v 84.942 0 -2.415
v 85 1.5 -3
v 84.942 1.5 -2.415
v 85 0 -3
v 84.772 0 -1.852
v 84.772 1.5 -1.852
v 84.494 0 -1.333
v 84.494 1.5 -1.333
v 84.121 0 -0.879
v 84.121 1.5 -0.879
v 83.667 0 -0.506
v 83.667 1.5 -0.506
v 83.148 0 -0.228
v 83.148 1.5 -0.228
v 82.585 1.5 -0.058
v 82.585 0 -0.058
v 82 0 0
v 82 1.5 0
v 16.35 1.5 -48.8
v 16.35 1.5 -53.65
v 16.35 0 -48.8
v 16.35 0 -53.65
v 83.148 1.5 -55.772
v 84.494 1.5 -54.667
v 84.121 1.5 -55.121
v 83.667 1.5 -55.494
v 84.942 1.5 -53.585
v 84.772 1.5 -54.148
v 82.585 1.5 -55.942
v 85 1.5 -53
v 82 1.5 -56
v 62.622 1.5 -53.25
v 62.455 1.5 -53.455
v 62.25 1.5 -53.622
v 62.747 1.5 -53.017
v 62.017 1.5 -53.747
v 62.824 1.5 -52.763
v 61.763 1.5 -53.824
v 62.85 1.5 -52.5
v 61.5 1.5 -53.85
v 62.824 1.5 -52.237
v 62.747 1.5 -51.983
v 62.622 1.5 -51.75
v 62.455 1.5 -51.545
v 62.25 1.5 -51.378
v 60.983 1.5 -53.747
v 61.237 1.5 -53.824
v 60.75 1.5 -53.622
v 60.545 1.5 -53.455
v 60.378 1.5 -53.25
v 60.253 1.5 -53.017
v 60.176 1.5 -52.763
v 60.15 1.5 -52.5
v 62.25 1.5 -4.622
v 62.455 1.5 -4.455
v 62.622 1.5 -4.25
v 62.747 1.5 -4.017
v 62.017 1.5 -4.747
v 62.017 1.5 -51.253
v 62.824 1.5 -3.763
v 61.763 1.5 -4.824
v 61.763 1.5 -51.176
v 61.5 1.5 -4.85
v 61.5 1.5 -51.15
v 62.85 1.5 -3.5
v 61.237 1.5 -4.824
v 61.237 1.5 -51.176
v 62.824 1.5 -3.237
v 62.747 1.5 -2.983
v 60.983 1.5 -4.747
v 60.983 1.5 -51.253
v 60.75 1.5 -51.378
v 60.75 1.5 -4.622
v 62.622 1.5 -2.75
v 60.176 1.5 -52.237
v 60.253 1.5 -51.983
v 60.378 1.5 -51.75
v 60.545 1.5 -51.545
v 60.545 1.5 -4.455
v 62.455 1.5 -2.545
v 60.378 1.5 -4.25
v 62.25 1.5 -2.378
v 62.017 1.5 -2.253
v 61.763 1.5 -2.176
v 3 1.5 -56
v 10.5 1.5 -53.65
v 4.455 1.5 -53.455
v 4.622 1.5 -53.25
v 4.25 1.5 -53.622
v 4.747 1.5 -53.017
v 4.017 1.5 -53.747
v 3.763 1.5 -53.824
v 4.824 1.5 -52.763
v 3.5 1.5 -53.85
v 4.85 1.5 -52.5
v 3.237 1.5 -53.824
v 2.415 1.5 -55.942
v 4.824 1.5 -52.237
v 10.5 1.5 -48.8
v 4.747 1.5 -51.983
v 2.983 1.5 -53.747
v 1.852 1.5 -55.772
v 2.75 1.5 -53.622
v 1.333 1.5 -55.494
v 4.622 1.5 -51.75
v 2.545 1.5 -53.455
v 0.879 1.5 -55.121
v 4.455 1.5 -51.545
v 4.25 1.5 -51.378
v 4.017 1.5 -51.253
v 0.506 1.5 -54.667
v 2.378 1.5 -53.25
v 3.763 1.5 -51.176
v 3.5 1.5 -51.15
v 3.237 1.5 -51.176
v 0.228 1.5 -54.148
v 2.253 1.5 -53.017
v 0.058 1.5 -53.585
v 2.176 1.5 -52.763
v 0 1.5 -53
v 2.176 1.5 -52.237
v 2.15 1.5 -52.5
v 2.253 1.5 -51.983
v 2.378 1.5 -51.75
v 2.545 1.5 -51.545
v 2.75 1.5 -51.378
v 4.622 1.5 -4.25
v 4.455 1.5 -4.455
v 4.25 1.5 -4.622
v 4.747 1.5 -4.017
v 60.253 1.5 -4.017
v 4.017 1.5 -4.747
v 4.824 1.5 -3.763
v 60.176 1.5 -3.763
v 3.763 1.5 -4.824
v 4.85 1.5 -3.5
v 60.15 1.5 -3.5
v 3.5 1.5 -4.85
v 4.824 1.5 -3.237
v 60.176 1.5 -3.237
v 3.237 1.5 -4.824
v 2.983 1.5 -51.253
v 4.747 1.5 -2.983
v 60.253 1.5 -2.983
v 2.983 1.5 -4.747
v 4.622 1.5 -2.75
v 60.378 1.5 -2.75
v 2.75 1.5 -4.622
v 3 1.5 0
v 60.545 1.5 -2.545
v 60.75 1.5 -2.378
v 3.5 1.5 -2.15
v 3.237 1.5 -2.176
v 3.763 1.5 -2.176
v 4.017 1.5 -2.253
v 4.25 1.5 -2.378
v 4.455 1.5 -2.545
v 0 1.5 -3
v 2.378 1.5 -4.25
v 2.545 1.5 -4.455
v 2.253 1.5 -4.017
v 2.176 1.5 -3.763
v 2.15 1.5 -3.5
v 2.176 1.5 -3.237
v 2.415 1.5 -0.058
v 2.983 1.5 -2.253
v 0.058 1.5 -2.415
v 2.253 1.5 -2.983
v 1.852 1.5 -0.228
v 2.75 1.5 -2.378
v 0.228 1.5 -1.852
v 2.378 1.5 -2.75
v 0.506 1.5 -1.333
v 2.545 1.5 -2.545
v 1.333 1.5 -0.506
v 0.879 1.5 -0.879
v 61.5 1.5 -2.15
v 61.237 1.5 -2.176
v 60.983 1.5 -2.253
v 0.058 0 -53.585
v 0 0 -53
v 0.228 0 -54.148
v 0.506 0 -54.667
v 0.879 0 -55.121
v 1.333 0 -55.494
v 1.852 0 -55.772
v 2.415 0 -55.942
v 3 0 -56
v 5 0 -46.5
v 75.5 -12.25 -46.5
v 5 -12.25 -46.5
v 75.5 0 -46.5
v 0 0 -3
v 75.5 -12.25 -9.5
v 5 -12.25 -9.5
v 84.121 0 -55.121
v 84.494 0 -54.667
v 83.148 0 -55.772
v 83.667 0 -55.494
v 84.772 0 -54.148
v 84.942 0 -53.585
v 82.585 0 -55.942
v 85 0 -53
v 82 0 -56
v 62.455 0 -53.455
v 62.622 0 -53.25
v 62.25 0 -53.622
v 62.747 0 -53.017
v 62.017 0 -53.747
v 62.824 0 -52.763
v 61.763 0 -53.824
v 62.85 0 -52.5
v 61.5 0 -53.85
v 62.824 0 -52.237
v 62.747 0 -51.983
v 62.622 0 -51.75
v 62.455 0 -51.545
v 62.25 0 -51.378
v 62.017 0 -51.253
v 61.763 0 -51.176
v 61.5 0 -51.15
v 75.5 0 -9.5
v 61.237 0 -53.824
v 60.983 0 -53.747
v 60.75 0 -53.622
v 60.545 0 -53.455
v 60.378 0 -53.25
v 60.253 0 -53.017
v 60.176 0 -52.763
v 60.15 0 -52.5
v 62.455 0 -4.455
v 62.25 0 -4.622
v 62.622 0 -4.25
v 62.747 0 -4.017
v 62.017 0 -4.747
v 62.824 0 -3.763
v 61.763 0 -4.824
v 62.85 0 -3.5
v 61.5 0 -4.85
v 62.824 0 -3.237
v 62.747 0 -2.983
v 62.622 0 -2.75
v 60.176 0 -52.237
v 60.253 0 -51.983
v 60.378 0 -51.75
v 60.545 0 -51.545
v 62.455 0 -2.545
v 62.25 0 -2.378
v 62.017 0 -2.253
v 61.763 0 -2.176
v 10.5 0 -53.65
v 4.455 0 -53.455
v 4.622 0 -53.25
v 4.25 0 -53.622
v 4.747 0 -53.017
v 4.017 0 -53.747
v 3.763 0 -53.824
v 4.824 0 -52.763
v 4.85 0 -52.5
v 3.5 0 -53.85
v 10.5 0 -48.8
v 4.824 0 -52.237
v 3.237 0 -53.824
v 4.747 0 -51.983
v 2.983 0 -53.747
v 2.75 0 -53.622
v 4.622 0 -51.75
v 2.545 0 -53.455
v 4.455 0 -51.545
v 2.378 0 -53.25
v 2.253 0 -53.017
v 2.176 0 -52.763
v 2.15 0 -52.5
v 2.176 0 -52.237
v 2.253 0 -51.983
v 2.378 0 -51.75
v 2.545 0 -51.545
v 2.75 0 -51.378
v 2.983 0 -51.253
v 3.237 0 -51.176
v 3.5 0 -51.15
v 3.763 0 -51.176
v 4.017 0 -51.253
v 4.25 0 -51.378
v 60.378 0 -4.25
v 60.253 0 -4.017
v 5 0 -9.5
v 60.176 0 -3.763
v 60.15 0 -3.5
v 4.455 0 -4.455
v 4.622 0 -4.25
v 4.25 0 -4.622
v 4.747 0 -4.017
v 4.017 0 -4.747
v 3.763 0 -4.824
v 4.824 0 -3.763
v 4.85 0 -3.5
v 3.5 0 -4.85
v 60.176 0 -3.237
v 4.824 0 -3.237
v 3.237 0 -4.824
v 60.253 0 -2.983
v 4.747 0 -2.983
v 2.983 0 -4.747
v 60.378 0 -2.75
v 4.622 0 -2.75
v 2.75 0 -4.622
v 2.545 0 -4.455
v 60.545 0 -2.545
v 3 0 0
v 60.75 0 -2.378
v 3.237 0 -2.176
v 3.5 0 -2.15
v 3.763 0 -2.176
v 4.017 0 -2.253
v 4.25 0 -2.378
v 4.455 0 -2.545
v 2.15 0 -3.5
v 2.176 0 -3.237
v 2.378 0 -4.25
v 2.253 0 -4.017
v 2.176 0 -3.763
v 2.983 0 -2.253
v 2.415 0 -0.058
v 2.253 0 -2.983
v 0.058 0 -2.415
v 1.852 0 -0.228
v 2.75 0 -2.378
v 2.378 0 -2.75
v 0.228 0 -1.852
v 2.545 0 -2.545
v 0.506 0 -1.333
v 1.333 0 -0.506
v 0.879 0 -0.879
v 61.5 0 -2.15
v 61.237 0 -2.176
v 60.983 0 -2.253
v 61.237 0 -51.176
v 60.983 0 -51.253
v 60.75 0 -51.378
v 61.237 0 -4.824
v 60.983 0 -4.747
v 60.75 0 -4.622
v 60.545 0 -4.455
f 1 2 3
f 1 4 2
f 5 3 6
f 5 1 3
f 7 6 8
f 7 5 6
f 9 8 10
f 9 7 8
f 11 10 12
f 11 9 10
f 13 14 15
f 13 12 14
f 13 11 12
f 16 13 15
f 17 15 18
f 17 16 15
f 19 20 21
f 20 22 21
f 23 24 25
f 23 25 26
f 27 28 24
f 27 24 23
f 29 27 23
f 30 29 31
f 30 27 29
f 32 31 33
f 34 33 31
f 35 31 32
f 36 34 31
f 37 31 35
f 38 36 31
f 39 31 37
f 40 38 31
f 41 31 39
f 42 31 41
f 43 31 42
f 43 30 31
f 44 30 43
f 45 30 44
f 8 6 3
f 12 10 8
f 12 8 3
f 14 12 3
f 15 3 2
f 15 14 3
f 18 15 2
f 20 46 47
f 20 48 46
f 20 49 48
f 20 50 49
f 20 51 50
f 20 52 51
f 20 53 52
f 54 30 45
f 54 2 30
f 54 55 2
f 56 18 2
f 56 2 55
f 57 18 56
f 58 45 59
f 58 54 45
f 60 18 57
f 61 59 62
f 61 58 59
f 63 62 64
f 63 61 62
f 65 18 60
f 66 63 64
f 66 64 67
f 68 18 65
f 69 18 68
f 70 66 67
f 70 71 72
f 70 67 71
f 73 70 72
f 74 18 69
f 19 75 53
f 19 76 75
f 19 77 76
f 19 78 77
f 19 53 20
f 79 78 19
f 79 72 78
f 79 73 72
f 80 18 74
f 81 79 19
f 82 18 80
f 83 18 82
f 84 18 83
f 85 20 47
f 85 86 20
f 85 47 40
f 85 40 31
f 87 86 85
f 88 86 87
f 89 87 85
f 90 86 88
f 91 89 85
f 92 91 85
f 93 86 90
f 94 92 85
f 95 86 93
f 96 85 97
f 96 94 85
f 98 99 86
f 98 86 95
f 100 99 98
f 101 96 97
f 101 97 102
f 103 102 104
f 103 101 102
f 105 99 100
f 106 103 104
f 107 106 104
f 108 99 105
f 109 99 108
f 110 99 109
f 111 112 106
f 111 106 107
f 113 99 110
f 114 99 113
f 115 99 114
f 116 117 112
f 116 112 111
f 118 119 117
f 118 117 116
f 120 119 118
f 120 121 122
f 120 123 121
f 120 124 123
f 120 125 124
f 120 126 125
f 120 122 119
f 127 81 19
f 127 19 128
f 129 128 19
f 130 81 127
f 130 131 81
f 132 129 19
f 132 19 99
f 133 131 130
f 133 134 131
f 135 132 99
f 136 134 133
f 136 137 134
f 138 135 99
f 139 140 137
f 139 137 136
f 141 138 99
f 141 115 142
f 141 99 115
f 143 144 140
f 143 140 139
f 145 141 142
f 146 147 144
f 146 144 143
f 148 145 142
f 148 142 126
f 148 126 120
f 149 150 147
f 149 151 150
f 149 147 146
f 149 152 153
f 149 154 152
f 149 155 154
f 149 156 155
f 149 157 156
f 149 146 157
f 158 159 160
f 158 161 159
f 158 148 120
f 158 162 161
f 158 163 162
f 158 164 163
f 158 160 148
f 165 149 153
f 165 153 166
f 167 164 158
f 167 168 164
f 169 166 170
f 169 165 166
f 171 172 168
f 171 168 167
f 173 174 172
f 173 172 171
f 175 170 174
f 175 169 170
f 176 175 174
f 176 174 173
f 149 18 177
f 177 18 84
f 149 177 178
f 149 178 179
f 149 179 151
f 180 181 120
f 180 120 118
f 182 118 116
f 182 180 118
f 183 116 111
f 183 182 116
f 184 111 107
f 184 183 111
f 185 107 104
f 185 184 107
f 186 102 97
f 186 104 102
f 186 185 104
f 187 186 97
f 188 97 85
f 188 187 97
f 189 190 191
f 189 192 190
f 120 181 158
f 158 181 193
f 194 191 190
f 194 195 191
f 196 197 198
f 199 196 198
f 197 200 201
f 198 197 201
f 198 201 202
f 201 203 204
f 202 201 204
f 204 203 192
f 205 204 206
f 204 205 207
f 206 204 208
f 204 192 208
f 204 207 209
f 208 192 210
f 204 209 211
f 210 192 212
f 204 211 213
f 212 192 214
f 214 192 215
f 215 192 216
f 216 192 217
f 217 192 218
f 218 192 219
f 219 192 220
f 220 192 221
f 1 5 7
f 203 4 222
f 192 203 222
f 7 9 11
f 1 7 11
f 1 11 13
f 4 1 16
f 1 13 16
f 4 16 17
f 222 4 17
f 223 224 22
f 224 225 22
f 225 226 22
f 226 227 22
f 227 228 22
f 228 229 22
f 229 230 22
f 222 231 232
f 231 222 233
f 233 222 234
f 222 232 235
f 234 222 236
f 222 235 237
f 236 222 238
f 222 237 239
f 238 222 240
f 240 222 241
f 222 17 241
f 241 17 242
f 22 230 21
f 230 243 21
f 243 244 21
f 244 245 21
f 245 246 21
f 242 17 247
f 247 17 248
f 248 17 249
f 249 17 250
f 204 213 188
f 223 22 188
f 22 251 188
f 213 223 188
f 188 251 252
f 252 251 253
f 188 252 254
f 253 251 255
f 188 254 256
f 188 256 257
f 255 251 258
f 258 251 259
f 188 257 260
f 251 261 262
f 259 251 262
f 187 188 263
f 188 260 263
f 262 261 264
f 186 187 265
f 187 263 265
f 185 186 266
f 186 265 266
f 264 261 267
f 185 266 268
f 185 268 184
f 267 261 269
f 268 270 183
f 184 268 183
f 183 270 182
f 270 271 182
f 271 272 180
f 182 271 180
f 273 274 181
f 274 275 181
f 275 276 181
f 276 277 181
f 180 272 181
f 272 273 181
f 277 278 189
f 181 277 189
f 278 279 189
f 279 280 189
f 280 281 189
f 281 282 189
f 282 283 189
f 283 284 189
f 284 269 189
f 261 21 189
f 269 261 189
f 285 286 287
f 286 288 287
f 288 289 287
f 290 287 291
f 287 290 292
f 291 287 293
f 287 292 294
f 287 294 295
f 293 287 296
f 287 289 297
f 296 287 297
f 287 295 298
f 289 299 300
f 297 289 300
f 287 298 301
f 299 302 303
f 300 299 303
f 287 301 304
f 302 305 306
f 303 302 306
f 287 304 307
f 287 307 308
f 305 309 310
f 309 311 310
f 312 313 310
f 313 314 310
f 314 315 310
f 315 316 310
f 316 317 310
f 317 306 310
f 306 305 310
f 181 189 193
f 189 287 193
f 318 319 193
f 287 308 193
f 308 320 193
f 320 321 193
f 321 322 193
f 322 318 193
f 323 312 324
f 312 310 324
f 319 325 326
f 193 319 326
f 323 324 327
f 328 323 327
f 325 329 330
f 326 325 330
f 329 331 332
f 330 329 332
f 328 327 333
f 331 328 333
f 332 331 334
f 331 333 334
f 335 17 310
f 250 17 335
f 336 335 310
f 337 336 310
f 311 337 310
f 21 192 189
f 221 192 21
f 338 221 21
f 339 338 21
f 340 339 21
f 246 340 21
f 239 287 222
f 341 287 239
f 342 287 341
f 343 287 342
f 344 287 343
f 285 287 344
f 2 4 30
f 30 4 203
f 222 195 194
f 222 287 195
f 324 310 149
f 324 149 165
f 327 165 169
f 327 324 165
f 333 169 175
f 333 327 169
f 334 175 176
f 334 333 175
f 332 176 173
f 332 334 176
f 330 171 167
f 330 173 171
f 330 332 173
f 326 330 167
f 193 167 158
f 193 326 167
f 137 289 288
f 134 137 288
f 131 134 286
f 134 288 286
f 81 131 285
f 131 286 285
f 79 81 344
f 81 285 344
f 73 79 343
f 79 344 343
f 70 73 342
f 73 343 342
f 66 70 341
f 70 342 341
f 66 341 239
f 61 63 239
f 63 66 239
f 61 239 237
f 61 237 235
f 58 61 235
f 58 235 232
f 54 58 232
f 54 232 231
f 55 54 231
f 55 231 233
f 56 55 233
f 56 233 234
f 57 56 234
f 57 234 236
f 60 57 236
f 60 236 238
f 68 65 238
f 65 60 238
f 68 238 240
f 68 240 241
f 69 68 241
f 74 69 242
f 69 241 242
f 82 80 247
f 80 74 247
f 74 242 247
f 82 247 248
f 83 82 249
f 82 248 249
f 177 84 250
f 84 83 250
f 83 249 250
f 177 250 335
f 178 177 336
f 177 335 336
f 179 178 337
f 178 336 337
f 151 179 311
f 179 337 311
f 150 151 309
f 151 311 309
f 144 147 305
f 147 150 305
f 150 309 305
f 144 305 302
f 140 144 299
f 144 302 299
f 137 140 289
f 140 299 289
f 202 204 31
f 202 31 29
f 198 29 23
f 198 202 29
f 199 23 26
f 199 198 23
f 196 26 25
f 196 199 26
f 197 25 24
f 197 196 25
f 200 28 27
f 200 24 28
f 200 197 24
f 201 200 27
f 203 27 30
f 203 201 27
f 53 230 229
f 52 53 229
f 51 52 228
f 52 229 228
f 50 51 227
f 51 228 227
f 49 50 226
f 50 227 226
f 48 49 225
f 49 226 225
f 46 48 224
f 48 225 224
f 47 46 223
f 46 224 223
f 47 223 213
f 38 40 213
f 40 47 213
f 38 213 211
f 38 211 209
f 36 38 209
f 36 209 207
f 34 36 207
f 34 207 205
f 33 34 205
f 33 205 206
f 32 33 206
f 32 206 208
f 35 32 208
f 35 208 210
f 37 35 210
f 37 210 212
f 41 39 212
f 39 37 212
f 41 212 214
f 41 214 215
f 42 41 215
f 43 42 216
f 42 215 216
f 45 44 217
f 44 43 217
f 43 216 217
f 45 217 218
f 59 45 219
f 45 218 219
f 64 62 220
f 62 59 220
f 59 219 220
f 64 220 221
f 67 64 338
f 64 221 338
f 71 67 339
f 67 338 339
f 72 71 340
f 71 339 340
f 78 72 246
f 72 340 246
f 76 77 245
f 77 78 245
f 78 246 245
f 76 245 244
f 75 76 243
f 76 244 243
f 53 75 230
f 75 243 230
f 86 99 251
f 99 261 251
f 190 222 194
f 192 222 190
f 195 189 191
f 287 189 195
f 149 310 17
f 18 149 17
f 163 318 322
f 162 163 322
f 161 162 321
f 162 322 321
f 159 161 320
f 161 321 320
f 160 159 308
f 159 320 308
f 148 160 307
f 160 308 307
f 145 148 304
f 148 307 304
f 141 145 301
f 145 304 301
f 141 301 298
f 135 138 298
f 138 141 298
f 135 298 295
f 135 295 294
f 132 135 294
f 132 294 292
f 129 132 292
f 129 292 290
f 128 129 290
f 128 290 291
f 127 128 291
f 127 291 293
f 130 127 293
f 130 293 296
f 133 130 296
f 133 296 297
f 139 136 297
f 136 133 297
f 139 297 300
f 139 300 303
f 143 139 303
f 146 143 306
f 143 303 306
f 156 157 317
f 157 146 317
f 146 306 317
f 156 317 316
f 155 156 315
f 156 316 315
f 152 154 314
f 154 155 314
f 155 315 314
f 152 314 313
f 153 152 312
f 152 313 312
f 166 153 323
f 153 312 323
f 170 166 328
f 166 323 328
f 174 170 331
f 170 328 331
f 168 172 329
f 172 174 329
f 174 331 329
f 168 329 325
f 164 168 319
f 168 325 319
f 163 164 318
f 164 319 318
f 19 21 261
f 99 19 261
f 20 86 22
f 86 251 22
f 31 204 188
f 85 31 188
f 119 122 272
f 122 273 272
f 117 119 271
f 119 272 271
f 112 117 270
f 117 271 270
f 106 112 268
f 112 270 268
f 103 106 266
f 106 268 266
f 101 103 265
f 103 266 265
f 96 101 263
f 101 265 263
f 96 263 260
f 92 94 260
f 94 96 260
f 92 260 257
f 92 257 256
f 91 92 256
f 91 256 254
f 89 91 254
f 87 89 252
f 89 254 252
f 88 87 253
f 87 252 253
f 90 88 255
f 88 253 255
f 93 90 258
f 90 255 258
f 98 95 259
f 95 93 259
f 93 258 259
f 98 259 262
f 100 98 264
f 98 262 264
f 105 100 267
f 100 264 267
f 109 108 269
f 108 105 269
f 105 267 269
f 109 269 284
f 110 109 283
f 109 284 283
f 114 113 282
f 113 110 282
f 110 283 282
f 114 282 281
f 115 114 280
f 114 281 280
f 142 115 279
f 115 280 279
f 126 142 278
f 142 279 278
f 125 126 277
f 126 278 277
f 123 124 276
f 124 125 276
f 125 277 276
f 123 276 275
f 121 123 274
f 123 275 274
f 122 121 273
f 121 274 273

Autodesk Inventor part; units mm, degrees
ref_plane "YZ Plane" through (0, 0, 0) normal (1, 0, 0) x (0, 1, 0)
ref_plane "XZ Plane" through (0, 0, 0) normal (0, 1, 0) x (-1, 0, 0)
ref_plane "XY Plane" through (0, 0, 0) normal (0, 0, 1) x (1, 0, 0)
sketch "Sketch1" plane through (0, 0, 0) normal (0, 1, 0) x (-1, 0, 0)
  line L0 (-3, 0) -> (-82, 0)
  line L1 (-85, -3) -> (-85, -53)
  line L2 (-82, -56) -> (-3, -56)
  line L3 (0, -53) -> (0, -3)
  arc A0 (-3, -56) -> (0, -53) centre (-3, -53) ccw
  arc A1 (0, -3) -> (-3, 0) centre (-3, -3) ccw
  arc A2 (-82, 0) -> (-85, -3) centre (-82, -3) ccw
  arc A3 (-85, -53) -> (-82, -56) centre (-82, -53) ccw
  circle A4 centre (-3.5, -52.5) radius 1.35
  circle A5 centre (-3.5, -3.5) radius 1.35
  circle A6 centre (-61.5, -52.5) radius 1.35
  circle A7 centre (-61.5, -3.5) radius 1.35
  point P0 (0, 0)
  point P1 (-85, -56)
  point P2 (-85, 0)
  point P3 (0, -56)
  dimension "d0" = 85
  dimension "d1" = 56
  dimension "d2" = 3
  dimension "d9" = 2.7
  dimension "d10" = 2.7
  dimension "d15" = 2.7
  dimension "d16" = 2.7
  dimension "d140" = 58
  dimension "d141" = 58
  dimension "d142" = 49
  dimension "d143" = 3.5
extrude "Extrusion1" add sketch "Sketch1" along normal blind 1.5
sketch "Sketch12" plane through (0, 0, 0) normal (0, -1, 0) x (1, 0, 0)
  line L0 (5, -9.5) -> (75.5, -9.5)
  line L1 (75.5, -9.5) -> (75.5, -46.5)
  line L2 (75.5, -46.5) -> (5, -46.5)
  line L3 (5, -46.5) -> (5, -9.5)
  line L4 (82, -56) -> (3, -56) projected
  line L5 (85, -3) -> (85, -53) projected
  line L6 (3, 0) -> (82, 0) projected
  line L7 (0, -53) -> (0, -3) projected
  point P0 (0, 0)
  dimension "d152" = 9.5
  dimension "d153" = 9.5
  dimension "d154" = 9.5
  dimension "d155" = 5
extrude "Extrusion12" add sketch "Sketch12" along normal blind 12.25
sketch "Sketch13" plane through (0, 0, 0) normal (0, -1, 0) x (1, 0, 0)
  line L0 (10.5, -53.65) -> (16.35, -53.65)
  line L1 (16.35, -53.65) -> (16.35, -48.8)
  line L2 (16.35, -48.8) -> (10.5, -48.8)
  line L3 (10.5, -48.8) -> (10.5, -53.65)
  line L4 (0, -53) -> (0, -3) projected
  line L5 (82, -56) -> (3, -56) projected
  point P0 (0, 0)
  dimension "d146" = 10.5
  dimension "d147" = 2.35
  dimension "d148" = 4.85
  dimension "d149" = 5.85
extrude "Extrusion13" cut sketch "Sketch13" against normal up to next
properties part number "Pi4BatteryBoard_Mockup"
